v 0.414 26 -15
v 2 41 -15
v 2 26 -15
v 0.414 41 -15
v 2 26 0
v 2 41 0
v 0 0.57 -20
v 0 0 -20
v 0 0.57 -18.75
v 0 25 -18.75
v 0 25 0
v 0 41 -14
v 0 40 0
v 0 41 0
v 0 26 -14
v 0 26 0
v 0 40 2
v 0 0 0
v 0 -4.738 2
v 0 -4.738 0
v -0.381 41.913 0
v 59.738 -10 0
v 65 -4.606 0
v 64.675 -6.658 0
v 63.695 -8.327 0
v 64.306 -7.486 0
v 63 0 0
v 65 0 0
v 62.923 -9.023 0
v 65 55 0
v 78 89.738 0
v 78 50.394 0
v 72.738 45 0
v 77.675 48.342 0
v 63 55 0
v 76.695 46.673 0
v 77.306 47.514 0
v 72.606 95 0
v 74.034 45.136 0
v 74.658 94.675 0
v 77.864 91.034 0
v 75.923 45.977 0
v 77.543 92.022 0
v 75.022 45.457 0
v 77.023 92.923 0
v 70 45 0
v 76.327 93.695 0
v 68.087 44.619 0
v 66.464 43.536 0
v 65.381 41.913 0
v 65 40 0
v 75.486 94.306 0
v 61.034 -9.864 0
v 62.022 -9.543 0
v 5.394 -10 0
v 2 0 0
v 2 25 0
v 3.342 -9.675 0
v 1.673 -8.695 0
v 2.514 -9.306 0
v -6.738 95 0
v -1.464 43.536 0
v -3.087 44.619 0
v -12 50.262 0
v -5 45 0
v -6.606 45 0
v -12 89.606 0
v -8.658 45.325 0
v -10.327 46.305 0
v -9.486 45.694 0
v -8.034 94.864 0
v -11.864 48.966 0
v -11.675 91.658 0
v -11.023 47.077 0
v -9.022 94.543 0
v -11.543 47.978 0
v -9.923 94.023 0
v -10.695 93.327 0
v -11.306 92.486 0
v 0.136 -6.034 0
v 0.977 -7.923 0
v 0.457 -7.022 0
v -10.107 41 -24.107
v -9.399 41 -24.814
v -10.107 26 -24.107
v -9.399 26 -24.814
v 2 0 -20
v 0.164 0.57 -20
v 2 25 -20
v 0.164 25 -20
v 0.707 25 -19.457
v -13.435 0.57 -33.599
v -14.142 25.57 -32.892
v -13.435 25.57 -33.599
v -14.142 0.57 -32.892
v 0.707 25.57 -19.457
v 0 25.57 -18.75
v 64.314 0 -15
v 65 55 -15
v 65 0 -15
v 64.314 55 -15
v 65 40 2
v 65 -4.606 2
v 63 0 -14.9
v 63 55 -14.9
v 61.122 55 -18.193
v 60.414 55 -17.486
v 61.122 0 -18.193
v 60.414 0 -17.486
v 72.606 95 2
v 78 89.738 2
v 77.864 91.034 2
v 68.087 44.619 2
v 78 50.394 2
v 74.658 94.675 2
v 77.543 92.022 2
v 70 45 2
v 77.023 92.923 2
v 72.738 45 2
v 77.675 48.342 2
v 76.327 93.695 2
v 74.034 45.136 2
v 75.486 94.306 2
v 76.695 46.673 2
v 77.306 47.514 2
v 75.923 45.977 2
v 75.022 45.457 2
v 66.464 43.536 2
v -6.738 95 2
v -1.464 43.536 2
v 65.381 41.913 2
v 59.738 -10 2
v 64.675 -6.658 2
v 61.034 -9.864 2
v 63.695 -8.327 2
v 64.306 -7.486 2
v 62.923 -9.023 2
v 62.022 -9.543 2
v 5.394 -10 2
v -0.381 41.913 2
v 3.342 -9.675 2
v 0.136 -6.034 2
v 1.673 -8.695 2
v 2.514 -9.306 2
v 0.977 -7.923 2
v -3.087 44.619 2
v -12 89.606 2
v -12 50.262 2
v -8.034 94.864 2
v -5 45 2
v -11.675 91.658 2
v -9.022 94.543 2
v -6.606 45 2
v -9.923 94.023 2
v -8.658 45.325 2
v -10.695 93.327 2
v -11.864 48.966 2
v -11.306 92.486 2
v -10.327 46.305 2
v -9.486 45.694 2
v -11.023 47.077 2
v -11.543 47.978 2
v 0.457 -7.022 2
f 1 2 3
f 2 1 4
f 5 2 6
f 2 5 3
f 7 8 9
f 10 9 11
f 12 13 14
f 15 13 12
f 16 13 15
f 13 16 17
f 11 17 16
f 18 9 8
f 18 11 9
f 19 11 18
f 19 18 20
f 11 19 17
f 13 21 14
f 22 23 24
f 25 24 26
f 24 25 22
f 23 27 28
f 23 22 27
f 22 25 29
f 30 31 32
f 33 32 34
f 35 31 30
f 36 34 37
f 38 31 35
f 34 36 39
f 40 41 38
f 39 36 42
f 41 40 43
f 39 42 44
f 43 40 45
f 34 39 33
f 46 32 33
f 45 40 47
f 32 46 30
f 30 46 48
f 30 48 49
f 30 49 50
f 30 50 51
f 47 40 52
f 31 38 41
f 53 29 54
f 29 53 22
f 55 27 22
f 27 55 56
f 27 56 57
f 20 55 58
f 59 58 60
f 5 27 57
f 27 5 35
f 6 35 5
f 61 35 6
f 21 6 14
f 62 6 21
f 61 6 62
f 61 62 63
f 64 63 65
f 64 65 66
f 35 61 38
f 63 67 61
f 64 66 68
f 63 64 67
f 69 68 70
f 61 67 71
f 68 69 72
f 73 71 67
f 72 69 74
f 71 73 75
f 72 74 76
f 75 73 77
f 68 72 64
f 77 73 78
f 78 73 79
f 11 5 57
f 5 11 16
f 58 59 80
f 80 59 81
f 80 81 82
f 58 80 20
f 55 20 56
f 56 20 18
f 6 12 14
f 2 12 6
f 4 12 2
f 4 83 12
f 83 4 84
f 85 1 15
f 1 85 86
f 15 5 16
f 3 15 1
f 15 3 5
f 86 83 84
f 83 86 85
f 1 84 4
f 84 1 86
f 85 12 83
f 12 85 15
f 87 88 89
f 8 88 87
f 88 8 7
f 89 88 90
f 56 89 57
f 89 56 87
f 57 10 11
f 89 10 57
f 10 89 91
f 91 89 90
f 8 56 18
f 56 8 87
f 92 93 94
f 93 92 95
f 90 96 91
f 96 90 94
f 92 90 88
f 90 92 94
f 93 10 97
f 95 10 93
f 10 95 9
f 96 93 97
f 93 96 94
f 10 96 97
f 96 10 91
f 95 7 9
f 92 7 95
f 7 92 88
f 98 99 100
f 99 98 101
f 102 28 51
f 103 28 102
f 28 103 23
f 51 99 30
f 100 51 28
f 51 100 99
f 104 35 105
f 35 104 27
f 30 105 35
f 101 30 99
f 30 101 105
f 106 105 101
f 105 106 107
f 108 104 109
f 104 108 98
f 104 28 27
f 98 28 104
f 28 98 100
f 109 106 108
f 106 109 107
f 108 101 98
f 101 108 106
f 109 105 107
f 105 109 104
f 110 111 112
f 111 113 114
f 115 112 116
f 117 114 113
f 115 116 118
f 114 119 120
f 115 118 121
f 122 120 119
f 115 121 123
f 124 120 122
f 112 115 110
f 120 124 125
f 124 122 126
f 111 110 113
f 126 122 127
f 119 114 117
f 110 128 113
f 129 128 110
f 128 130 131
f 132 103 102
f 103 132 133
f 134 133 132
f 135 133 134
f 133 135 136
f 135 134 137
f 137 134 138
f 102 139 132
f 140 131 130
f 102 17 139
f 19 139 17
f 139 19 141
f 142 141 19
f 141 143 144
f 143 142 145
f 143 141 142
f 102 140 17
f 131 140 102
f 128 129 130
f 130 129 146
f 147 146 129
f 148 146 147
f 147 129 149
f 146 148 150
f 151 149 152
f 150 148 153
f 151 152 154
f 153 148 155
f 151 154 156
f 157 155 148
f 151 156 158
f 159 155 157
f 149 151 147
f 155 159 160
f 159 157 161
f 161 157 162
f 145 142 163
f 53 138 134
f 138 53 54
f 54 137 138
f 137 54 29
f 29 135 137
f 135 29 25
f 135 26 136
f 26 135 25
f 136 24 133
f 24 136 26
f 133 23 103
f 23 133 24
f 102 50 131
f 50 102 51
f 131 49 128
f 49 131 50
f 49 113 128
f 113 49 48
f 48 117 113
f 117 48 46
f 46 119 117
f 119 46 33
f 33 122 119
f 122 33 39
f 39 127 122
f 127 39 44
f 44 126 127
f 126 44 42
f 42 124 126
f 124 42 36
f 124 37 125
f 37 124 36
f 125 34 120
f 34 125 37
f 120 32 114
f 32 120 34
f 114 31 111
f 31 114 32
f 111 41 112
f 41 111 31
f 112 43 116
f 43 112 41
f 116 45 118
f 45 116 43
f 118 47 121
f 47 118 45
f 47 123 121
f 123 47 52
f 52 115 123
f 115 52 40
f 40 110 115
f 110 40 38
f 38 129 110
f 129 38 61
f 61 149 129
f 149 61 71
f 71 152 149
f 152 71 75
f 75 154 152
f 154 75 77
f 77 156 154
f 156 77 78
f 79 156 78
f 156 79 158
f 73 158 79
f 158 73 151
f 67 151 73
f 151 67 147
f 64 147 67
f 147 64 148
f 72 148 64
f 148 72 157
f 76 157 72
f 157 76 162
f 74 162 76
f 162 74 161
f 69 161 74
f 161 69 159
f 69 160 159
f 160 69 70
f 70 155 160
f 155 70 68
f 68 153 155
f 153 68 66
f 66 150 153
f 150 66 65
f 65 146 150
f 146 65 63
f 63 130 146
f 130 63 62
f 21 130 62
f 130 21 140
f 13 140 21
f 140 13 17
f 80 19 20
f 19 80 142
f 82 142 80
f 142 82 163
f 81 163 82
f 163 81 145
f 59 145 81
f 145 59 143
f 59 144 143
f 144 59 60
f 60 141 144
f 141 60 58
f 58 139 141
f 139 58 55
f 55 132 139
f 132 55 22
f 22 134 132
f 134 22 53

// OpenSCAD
union()
{
    linear_extrude(2)
offset(-5)offset(10)offset(-5){
   translate([-0,-10,0]) square([65,100]);

translate([-12,45,0])
square([90,50]);
}
translate([0,26,0])rotate([0,90,0]){cube([15,15,2]);
    
translate([13.5,0,.5])rotate([0,45,0]){cube([15,15,1]);
}
}


translate([0,0,0])rotate([0,90,0]){cube([20,25,2]);
    
translate([18.75,00.57])rotate([0,45,0]){cube([20,25,1]);
}
}

translate([63,,0])rotate([0,90,0]){cube([15,55,2]);
    
translate([13.95,0,.95])rotate([0,45,0]){cube([5,55,1]);
}
}
}
